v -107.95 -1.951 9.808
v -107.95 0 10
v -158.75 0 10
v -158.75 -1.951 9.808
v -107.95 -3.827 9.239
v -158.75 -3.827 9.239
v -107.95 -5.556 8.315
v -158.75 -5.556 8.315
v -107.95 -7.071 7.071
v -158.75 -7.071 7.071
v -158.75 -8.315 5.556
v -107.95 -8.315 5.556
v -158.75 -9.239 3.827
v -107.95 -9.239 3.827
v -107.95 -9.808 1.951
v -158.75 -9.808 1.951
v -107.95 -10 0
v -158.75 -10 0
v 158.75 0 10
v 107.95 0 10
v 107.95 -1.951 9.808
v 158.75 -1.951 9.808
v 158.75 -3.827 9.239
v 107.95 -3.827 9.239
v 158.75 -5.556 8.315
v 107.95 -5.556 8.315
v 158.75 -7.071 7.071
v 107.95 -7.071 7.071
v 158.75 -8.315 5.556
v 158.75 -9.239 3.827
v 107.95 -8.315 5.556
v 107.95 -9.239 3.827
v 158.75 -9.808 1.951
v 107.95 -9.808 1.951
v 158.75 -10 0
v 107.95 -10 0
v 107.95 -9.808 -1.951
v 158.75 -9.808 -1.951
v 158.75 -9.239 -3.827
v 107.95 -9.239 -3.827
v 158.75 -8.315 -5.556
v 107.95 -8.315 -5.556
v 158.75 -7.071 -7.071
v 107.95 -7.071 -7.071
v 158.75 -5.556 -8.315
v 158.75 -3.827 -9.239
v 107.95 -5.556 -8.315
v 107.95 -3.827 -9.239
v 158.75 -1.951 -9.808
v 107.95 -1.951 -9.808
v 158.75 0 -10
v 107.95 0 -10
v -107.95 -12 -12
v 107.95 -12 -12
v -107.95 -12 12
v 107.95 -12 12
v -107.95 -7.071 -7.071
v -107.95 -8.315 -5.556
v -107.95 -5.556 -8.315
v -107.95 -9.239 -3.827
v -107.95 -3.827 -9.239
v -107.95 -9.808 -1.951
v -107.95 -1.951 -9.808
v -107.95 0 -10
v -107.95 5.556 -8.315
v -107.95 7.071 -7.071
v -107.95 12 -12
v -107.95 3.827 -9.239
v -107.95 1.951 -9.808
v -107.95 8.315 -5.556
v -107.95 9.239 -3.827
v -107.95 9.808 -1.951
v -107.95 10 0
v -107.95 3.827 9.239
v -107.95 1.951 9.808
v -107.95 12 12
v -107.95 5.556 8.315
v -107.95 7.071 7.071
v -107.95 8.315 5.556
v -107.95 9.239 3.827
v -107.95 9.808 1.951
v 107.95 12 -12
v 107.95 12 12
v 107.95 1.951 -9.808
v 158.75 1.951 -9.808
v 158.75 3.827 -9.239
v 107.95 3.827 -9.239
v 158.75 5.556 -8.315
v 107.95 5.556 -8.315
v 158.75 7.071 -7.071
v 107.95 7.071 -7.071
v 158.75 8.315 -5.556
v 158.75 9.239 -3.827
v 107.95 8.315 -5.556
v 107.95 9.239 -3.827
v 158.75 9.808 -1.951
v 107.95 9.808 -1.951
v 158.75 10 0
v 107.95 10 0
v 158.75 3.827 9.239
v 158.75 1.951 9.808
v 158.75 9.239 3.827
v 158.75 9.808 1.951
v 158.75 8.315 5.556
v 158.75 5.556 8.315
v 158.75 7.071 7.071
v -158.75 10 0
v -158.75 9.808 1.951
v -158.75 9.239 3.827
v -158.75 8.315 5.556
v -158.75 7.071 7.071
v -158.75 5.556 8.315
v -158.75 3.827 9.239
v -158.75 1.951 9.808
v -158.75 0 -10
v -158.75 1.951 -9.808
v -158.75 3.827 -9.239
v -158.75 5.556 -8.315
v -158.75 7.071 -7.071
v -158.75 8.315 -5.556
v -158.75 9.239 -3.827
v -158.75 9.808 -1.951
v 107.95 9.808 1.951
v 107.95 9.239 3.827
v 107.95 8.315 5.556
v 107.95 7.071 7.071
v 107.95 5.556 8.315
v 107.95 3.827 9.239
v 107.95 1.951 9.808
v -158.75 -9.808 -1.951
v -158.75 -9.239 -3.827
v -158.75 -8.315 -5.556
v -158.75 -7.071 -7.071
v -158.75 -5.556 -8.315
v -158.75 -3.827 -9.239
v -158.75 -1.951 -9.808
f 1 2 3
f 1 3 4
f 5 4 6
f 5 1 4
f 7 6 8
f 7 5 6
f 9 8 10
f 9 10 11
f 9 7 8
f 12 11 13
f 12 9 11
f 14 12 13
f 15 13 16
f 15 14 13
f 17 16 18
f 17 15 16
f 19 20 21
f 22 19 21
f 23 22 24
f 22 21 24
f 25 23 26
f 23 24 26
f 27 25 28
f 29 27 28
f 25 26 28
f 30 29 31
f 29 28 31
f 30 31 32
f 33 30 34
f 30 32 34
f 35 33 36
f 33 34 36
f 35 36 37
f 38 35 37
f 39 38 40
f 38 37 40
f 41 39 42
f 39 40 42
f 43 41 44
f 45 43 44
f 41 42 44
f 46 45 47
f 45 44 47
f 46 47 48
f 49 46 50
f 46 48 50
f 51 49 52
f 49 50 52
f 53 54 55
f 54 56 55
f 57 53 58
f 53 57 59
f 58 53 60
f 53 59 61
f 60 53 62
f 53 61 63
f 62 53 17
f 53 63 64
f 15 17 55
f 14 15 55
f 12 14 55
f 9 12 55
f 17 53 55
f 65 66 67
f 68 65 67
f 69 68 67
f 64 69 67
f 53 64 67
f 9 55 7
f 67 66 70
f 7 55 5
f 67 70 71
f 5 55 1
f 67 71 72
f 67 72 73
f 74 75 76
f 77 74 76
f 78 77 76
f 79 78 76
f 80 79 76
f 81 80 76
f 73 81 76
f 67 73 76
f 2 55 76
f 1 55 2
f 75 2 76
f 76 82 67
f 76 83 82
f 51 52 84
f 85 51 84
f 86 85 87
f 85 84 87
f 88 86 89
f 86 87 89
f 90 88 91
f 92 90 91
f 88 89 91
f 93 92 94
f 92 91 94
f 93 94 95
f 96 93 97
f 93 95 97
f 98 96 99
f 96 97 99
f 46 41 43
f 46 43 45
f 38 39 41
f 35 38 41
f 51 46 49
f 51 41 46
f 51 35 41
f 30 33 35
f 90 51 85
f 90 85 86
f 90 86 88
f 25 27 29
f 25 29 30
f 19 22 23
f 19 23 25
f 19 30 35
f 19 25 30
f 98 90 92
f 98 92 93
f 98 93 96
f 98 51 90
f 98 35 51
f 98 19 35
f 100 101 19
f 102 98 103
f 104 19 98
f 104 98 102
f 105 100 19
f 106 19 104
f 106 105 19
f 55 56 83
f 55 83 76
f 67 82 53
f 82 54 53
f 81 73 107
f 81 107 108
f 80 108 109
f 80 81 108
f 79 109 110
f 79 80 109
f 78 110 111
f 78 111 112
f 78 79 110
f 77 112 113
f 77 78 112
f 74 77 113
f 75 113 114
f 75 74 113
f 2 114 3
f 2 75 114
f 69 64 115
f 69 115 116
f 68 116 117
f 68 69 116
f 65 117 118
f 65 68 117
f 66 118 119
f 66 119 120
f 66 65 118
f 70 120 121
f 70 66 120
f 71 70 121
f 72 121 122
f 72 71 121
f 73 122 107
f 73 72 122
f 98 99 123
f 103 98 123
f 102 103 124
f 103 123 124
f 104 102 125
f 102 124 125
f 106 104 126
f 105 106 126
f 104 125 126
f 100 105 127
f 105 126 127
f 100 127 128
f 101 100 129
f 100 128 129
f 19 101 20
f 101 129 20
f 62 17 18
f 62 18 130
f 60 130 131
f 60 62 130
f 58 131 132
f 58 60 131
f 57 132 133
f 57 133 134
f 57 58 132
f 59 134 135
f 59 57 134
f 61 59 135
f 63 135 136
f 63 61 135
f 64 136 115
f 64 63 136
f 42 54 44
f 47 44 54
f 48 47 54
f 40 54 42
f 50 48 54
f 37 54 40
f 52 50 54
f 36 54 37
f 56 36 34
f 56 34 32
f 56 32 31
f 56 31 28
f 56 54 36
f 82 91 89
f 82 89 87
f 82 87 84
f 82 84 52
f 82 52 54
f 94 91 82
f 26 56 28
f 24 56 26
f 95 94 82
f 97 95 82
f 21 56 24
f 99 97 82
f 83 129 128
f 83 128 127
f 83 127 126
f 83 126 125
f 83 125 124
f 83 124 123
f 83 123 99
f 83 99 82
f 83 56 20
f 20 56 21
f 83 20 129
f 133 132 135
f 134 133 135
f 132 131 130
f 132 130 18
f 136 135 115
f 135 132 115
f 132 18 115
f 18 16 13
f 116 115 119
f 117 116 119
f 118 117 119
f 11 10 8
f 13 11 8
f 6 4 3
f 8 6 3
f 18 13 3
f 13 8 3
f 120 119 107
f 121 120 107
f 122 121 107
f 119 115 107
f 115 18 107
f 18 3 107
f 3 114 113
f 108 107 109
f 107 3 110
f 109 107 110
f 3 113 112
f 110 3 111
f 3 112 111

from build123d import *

# Parameters (mm, degrees)
F1_DEPTH = 107.95
F2_DEPTH = 158.75
F4_DEPTH = 2
F5_DEPTH = 2
F6_DEPTH = 2
F7_DEPTH = 2


with BuildPart() as f1:
    # F0 (on Right) → F1 (new body, symmetric)
    with BuildSketch(Plane.YZ):
        with BuildLine():
            ThreePointArc((-10, 0), (-7.0710678119, 7.0710678119), (0, 10))
            Line((0, 10), (-10, 10))
            Line((-10, 10), (-10, 0))
        make_face()
    extrude(amount=F1_DEPTH, both=True)


with BuildPart() as f1b:
    # F0 (on Right) → F1, piece 2 (new body, symmetric)
    with BuildSketch(Plane.YZ):
        with BuildLine():
            ThreePointArc((0, 10), (7.0710678119, 7.0710678119), (10, 0))
            Line((10, 0), (10, 10))
            Line((10, 10), (0, 10))
        make_face()
    extrude(amount=F1_DEPTH, both=True)


with BuildPart() as f1c:
    # F0 (on Right) → F1, piece 3 (new body, symmetric)
    with BuildSketch(Plane.YZ):
        with BuildLine():
            Line((10, -10), (10, 0))
            ThreePointArc((10, 0), (7.0710678119, -7.0710678119), (0, -10))
            Line((0, -10), (10, -10))
        make_face()
    extrude(amount=F1_DEPTH, both=True)


with BuildPart() as f1d:
    # F0 (on Right) → F1, piece 4 (new body, symmetric)
    with BuildSketch(Plane.YZ):
        with BuildLine():
            Line((-10, -10), (0, -10))
            ThreePointArc((0, -10), (-7.0710678119, -7.0710678119), (-10, 0))
            Line((-10, 0), (-10, -10))
        make_face()
    extrude(amount=F1_DEPTH, both=True)


with BuildPart() as f2:
    # F0 (on Right) → F2 (new body, symmetric)
    with BuildSketch(Plane.YZ):
        with BuildLine():
            ThreePointArc((0, -10), (7.0710678119, -7.0710678119), (10, 0))
            ThreePointArc((10, 0), (7.0710678119, 7.0710678119), (0, 10))
            ThreePointArc((0, 10), (-7.0710678119, 7.0710678119), (-10, 0))
            ThreePointArc((-10, 0), (-7.0710678119, -7.0710678119), (0, -10))
        make_face()
    extrude(amount=F2_DEPTH, both=True)


with BuildPart() as f1_1:
    add(f1.part)

    # F3: union F1b, F2, F1c, F1d
    add(f1b.part)
    add(f2.part)
    add(f1c.part)
    add(f1d.part)

    # F4 (add): a face of the model
    f4_faces = [f1_1.faces().sort_by_distance(p)[0] for p in [
        (0, 0, 10),
    ]]
    extrude(f4_faces, amount=F4_DEPTH)

    # F5 (add): a face of the model
    f5_faces = [f1_1.faces().sort_by_distance(p)[0] for p in [
        (0, -10, 1),
    ]]
    extrude(f5_faces, amount=F5_DEPTH)

    # F6 (add): a face of the model
    f6_faces = [f1_1.faces().sort_by_distance(p)[0] for p in [
        (0, 10, 1),
    ]]
    extrude(f6_faces, amount=F6_DEPTH)

    # F7 (add): a face of the model
    f7_faces = [f1_1.faces().sort_by_distance(p)[0] for p in [
        (0, 0, -10),
    ]]
    extrude(f7_faces, amount=F7_DEPTH)


solid = f1_1.part
